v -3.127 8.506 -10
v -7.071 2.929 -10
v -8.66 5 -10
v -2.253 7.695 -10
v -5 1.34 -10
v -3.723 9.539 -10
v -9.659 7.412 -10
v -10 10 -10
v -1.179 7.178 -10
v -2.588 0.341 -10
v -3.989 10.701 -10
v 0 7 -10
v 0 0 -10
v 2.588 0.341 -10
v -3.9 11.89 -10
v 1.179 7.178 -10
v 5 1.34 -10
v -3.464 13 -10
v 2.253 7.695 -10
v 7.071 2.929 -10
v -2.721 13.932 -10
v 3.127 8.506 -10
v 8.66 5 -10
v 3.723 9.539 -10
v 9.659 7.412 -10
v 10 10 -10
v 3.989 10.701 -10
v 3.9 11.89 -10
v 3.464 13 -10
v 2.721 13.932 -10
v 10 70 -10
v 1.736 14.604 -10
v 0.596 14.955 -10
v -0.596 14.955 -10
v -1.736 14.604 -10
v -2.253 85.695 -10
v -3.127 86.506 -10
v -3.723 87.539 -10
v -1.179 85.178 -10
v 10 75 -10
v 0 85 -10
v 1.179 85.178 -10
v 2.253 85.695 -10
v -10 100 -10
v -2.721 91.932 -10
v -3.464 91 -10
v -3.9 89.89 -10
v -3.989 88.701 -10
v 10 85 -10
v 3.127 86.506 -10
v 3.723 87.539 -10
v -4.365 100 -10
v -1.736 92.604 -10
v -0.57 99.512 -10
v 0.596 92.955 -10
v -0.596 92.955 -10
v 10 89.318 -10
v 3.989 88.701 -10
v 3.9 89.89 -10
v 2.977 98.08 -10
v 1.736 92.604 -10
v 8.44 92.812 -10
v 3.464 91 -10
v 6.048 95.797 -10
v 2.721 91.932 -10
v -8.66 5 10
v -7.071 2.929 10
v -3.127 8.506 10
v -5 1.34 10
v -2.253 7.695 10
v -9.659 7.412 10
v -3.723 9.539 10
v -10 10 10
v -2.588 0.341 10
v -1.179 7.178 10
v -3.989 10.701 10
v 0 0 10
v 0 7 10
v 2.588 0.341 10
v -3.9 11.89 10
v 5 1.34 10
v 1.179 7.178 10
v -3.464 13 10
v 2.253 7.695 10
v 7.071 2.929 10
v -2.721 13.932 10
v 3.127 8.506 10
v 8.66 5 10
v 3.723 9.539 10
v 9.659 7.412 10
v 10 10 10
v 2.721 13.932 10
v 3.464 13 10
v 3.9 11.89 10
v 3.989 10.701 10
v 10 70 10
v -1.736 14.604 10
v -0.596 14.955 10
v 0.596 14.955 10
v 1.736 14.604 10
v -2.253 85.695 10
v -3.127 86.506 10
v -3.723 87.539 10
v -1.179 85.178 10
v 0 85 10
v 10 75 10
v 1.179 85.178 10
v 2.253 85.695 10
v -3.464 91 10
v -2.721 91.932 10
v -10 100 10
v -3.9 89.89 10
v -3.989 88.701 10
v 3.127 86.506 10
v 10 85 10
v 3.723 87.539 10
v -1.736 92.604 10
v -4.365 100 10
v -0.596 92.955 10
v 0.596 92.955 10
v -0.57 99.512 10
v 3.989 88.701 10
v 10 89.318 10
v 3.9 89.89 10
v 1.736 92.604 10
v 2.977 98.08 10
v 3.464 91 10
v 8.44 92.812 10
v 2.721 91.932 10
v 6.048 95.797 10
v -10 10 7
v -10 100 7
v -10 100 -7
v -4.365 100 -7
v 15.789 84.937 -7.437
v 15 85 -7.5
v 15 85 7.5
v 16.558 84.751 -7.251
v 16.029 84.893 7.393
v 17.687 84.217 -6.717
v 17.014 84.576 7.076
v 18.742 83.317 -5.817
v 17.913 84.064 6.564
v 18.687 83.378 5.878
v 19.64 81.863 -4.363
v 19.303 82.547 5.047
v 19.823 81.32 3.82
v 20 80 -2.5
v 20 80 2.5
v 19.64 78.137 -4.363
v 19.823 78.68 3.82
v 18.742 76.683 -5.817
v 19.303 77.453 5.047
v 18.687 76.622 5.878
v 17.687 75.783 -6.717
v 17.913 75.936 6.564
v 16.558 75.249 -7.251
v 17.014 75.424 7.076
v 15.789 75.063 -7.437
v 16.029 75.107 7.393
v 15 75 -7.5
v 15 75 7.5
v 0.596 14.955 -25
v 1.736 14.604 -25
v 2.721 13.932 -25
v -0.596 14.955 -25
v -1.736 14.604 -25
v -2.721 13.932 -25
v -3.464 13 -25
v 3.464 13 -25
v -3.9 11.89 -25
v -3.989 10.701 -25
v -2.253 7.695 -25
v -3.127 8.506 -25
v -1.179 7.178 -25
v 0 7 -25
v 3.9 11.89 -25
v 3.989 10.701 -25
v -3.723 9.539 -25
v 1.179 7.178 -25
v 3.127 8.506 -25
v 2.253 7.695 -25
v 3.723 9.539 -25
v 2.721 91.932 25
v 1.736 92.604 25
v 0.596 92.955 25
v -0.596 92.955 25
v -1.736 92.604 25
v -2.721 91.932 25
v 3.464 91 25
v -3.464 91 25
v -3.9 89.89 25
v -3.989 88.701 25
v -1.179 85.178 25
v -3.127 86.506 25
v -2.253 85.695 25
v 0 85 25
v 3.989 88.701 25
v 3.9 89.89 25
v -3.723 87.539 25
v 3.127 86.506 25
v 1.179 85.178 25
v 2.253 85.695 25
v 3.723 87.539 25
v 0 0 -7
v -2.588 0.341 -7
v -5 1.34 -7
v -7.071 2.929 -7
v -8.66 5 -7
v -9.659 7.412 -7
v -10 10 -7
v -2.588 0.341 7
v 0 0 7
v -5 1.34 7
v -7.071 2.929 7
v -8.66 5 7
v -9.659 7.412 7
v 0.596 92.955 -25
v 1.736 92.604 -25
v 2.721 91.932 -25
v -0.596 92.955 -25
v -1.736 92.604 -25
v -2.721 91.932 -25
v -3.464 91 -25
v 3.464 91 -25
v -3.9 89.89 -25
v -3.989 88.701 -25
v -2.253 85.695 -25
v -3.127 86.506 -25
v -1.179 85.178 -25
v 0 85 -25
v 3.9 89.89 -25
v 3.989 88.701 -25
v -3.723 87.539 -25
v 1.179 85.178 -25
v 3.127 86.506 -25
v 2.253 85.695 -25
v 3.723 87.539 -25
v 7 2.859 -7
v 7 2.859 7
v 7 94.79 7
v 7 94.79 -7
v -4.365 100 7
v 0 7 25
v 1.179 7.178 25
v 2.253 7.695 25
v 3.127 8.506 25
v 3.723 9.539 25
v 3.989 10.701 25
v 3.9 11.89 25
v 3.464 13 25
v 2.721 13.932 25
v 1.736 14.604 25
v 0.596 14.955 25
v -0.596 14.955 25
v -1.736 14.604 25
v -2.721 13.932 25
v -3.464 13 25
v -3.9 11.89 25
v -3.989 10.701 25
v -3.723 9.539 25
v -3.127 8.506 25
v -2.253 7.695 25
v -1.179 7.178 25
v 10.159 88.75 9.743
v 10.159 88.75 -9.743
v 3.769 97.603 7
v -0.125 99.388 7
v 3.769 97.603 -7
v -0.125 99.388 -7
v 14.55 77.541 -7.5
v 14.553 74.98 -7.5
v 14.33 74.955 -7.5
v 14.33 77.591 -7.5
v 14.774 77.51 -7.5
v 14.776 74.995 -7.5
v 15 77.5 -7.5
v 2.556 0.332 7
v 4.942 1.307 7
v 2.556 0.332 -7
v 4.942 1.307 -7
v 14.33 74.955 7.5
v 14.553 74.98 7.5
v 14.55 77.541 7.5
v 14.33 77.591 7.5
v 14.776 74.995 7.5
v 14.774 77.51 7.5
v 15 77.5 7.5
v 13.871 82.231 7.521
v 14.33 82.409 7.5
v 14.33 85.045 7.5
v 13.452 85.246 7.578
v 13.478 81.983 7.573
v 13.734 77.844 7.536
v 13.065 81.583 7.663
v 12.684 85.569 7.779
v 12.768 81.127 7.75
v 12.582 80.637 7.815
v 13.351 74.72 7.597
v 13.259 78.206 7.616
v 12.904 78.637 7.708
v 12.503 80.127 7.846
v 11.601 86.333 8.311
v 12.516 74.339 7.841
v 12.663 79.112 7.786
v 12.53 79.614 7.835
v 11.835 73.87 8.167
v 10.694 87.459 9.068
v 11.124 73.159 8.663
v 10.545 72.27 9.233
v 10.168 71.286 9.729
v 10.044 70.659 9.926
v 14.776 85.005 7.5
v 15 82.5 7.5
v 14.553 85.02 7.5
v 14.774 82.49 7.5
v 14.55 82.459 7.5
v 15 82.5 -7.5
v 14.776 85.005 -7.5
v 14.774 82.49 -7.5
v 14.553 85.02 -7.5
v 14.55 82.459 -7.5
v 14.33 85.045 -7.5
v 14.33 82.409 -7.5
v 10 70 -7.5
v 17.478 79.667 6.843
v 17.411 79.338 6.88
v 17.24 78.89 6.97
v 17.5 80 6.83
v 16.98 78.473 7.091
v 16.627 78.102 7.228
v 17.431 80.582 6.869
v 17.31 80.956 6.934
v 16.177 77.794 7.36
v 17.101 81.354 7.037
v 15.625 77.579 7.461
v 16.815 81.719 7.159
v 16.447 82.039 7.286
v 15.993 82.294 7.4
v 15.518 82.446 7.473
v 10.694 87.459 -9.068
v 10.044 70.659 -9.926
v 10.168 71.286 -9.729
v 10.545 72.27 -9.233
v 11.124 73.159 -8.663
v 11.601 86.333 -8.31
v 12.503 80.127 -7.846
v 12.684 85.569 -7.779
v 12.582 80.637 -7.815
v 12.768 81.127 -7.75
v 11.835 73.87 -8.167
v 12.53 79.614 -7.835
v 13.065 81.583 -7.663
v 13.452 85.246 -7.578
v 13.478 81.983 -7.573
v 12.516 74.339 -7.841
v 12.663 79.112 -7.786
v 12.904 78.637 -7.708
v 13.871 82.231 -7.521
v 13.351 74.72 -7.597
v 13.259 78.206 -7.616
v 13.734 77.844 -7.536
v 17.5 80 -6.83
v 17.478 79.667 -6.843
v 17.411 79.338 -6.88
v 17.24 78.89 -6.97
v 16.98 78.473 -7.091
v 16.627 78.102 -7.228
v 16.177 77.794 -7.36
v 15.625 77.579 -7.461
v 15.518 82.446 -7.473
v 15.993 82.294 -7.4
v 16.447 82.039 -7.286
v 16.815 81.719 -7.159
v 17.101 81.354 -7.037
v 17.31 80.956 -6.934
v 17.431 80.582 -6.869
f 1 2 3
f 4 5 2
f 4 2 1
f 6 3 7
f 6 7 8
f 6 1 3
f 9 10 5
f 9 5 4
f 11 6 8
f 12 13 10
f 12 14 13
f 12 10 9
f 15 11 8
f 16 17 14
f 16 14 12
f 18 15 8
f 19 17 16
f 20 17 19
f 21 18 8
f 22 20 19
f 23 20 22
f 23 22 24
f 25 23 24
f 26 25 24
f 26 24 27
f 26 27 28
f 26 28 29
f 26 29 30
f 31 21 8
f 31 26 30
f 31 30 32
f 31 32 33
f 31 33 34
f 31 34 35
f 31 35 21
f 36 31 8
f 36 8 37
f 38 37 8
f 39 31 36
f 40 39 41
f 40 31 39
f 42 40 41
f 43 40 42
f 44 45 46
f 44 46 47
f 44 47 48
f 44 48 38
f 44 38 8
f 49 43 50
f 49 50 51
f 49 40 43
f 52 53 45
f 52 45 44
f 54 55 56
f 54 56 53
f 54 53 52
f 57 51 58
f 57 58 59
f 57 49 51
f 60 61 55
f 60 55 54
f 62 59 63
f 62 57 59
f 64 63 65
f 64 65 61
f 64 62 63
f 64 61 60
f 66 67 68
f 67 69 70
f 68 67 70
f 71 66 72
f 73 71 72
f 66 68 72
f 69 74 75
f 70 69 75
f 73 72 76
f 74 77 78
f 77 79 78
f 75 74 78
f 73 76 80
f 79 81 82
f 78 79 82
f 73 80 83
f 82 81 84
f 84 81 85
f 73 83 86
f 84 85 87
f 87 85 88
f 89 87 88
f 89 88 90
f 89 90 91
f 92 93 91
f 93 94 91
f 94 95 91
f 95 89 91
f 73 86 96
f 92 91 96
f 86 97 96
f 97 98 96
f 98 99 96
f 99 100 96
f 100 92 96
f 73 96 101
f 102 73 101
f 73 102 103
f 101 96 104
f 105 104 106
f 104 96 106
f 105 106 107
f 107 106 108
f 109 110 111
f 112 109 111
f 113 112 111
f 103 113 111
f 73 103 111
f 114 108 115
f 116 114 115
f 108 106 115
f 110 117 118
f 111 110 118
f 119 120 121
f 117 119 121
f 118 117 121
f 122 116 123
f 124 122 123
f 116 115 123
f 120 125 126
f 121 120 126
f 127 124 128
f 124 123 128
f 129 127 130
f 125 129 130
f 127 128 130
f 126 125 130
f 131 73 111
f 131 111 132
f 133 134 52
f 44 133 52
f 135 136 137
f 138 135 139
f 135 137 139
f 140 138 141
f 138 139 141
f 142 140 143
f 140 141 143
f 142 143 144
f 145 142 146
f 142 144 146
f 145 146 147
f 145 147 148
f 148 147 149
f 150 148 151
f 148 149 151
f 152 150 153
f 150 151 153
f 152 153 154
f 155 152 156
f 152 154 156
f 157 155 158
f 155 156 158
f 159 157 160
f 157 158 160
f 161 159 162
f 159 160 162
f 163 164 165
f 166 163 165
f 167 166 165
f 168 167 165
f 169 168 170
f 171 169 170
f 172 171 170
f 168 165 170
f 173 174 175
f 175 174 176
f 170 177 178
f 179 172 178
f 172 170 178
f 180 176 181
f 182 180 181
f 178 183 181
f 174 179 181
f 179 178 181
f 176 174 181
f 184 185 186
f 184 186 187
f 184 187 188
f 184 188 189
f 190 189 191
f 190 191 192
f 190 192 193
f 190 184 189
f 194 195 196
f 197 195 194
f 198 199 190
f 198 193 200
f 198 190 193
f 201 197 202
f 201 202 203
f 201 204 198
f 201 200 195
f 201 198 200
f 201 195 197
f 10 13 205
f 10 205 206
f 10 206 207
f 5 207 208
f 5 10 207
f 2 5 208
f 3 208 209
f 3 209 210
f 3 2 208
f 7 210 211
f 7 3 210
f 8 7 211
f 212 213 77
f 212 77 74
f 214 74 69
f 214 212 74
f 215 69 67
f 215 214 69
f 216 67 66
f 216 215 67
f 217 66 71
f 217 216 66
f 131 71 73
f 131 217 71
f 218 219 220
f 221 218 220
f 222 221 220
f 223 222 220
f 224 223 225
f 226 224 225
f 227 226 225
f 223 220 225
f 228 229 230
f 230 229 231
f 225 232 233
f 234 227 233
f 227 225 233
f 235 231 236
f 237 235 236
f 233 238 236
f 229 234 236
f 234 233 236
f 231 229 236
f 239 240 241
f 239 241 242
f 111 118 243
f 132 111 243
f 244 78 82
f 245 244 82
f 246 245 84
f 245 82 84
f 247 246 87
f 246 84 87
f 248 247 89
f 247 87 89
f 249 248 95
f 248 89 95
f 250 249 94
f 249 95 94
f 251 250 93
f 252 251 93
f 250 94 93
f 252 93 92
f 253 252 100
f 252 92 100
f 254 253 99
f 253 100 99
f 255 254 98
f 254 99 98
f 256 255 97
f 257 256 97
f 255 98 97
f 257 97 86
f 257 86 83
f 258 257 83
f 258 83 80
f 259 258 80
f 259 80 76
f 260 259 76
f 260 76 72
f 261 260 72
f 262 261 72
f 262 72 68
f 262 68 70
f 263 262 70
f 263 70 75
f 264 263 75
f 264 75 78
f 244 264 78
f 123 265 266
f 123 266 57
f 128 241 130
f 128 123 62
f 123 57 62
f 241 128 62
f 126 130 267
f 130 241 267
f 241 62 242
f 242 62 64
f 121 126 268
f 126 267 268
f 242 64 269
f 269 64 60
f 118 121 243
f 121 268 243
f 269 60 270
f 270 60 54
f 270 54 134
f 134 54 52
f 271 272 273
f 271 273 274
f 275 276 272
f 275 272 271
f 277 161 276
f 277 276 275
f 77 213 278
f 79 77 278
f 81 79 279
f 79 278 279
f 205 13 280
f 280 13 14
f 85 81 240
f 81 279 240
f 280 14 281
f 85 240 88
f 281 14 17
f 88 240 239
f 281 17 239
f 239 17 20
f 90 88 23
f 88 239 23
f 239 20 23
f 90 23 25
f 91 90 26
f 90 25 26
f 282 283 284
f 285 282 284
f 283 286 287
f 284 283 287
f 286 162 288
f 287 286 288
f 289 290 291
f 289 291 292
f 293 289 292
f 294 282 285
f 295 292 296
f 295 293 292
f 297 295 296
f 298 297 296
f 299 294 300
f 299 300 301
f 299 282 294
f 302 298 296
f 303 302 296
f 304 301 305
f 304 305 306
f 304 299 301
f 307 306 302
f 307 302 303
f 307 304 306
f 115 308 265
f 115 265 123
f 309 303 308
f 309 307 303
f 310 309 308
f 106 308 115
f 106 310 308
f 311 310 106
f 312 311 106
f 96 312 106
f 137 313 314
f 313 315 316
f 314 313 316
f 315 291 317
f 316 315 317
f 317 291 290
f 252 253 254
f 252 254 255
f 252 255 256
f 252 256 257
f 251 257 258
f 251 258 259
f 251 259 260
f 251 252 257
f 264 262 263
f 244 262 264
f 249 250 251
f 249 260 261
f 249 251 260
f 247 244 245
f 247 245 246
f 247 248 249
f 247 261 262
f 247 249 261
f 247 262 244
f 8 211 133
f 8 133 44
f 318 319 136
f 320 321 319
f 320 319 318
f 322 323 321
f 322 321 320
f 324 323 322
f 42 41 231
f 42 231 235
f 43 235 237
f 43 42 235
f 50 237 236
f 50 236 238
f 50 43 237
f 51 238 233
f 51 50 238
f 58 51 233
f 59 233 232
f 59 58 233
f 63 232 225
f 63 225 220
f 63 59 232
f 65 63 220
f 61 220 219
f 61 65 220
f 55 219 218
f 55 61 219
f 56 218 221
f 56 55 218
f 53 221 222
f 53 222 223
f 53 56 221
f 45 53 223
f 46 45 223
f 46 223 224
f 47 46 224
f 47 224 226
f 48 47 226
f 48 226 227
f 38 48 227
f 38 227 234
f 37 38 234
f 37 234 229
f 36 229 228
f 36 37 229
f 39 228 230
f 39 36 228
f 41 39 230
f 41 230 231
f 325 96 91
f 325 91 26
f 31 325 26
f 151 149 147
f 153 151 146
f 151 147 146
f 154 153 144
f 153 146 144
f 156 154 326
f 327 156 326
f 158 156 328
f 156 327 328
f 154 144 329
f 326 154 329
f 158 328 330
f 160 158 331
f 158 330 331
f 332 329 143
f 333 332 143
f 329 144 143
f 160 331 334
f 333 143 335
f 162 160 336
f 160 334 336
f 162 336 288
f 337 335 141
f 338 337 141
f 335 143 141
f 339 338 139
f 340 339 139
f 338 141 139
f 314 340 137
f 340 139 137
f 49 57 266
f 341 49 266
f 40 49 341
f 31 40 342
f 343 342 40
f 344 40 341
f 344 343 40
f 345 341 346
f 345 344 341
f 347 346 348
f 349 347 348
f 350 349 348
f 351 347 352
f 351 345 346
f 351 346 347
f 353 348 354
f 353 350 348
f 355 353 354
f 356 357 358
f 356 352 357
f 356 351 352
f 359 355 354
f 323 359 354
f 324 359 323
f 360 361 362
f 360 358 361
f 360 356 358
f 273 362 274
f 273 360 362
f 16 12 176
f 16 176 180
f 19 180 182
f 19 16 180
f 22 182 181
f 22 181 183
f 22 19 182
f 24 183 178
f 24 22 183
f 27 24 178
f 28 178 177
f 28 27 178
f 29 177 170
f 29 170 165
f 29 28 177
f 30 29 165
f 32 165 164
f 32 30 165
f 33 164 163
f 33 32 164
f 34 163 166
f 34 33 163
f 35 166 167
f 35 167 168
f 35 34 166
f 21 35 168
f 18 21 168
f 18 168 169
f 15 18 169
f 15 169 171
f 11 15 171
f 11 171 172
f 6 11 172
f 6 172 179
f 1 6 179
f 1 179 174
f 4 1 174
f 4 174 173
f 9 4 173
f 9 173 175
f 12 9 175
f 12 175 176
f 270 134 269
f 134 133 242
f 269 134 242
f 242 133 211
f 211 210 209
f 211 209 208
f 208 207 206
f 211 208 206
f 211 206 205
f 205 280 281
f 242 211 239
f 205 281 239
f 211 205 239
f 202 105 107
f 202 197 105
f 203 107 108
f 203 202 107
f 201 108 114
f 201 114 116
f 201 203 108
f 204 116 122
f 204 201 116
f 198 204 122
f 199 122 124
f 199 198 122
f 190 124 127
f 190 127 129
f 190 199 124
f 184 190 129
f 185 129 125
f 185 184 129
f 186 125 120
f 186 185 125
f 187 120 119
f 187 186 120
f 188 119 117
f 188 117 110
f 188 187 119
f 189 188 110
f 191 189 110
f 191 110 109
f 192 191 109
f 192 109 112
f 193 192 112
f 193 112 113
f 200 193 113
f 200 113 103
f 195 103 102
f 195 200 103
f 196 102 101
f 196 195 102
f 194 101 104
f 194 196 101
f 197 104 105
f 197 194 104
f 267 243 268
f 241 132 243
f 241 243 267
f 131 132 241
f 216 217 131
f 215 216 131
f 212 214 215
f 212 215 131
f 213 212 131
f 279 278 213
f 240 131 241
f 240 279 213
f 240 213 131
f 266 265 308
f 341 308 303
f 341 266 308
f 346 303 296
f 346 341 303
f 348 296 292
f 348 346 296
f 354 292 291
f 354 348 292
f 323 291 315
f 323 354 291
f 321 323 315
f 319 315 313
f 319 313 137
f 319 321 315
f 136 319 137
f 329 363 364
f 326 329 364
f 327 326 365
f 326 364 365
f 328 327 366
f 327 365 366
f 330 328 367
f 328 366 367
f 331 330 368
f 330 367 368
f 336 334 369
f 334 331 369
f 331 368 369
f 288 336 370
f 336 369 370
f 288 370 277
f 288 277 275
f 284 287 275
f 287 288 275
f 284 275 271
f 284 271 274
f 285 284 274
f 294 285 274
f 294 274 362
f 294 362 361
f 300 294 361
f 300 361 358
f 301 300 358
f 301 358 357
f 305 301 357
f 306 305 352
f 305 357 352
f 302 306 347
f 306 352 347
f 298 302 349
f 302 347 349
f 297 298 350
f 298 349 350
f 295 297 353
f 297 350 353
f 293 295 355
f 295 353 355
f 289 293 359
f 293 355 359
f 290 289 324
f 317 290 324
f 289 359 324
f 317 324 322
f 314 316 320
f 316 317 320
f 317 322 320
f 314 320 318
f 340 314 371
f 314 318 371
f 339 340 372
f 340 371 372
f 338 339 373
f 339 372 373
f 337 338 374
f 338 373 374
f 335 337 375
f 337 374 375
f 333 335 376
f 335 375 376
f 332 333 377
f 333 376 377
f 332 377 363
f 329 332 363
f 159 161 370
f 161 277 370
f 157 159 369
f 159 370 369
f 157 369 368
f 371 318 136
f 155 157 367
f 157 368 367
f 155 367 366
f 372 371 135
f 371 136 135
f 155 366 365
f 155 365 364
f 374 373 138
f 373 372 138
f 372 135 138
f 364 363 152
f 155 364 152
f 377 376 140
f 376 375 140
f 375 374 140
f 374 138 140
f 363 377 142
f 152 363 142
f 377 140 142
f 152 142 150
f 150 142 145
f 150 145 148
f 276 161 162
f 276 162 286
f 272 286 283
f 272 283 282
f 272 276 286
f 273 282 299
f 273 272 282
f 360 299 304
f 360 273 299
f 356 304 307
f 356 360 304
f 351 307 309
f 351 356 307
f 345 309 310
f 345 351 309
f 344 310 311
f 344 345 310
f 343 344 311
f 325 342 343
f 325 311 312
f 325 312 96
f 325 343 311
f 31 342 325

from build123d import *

# Parameters (mm, degrees)
SKETCH1_W               = 20
SKETCH1_H               = 100
BOSS_EXTRUDE1_DEPTH     = 10
SKETCH3_R               = 4
BOSS_EXTRUDE2_DEPTH     = 25
FILLET1_R               = 10
SKETCH5_W               = 10
SKETCH5_H               = 10
SKETCH5_R               = 2.5
BOSS_EXTRUDE3_DEPTH     = 7.5
FILLET2_R               = 5
CUT_EXTRUDE1_DEPTH      = 106.000000019
CUT_EXTRUDE1_DEPTH_BACK = 106.000000019
SKETCH6_W               = 17
SKETCH6_H               = 14
FILLET3_R               = 15


# Some blends are built 0.0001 mm under size
with BuildPart() as part:
    # Sketch1 → Boss-Extrude1 (new, symmetric)
    with BuildSketch(Plane(origin=(0, 0, 0), x_dir=(0, 0, -1), z_dir=(1, 0, 0))):
        with Locations((0, 50)):
            Rectangle(SKETCH1_W, SKETCH1_H)
    extrude(amount=BOSS_EXTRUDE1_DEPTH, both=True)

    # Sketch3 → Boss-Extrude2 (add, symmetric)
    with BuildSketch(Plane.XY):
        with Locations(Location((0, 11, 0), (0, 0, 270))):
            Circle(SKETCH3_R)
        with Locations(Location((0, 89, 0), (0, 0, 270))):
            Circle(SKETCH3_R)
    extrude(amount=BOSS_EXTRUDE2_DEPTH, both=True)

    # Fillet1
    fillet1_edges = [part.edges().sort_by_distance(p)[0] for p in [
        (10, 0, 0),
        (-10, 0, 0),
    ]]
    fillet(fillet1_edges, radius=FILLET1_R - 0.0001)  # a hair under: the kernel refuses the full size

    # Sketch5 → Boss-Extrude3 (add, symmetric)
    with BuildSketch(Plane.XY):
        with Locations((15, 80)):
            Rectangle(SKETCH5_W, SKETCH5_H)
        with Locations((15, 80)):
            Circle(SKETCH5_R, mode=Mode.SUBTRACT)
    extrude(amount=BOSS_EXTRUDE3_DEPTH, both=True)

    # Fillet2
    # the kernel refuses this fillet: 5 mm, written as the material it takes off along each edge
    with BuildSketch(Plane(origin=(20, 97.5, 7.5), x_dir=(-1, 0, 0), z_dir=(0, -1, 0))) as fillet2_piece_1:
        with BuildLine():
            CenterArc((FILLET2_R, FILLET2_R), FILLET2_R, 180, 90)
            Line((0, FILLET2_R), (0, 0))
            Line((0, 0), (FILLET2_R, 0))
        make_face()
    extrude(amount=35, mode=Mode.SUBTRACT)
    with BuildSketch(Plane(origin=(20, 97.5, -7.5), x_dir=(-1, 0, 0), z_dir=(0, -1, 0))) as fillet2_piece_2:
        with BuildLine():
            CenterArc((FILLET2_R, -FILLET2_R), FILLET2_R, 90, 90)
            Line((0, -FILLET2_R), (0, 0))
            Line((0, 0), (FILLET2_R, 0))
        make_face()
    extrude(amount=35, mode=Mode.SUBTRACT)
    with BuildSketch(Plane(origin=(20, 75, 20), x_dir=(-1, 0, 0), z_dir=(0, 0, -1))) as fillet2_piece_3:
        with BuildLine():
            CenterArc((FILLET2_R, FILLET2_R), FILLET2_R, 180, 90)
            Line((0, FILLET2_R), (0, 0))
            Line((0, 0), (FILLET2_R, 0))
        make_face()
    extrude(amount=40, mode=Mode.SUBTRACT)
    with BuildSketch(Plane(origin=(20, 85, 20), x_dir=(-1, 0, 0), z_dir=(0, 0, -1))) as fillet2_piece_4:
        with BuildLine():
            CenterArc((FILLET2_R, -FILLET2_R), FILLET2_R, 90, 90)
            Line((0, -FILLET2_R), (0, 0))
            Line((0, 0), (FILLET2_R, 0))
        make_face()
    extrude(amount=40, mode=Mode.SUBTRACT)
    # the kernel refuses this fillet: 5 mm, written as the material it adds along each edge
    with BuildSketch(Plane(origin=(10, 75, 7.5), x_dir=(0, 0, 1), z_dir=(0, 1, 0))) as fillet2_2_piece_1_section:
        with BuildLine():
            CenterArc((5, 4.330127019), FILLET2_R, 180, 60)
            Line((0, 4.330127019), (0, 0))
            Line((0, 0), (2.5, 0))
        make_face()
    fillet2_2_piece_1 = extrude(amount=10, mode=Mode.PRIVATE)
    fillet2_2_piece_1 = fillet2_2_piece_1 - Plane(origin=(15, 80, 7.5), x_dir=(1, 0, 0), z_dir=(0, 0, -1)) * Cylinder(2.5, 38, mode=Mode.PRIVATE)
    add(fillet2_2_piece_1)
    with BuildSketch(Plane(origin=(10, 75, -7.5), x_dir=(0, 0, -1), z_dir=(0, 1, 0))) as fillet2_2_piece_2_section:
        with BuildLine():
            CenterArc((5, -4.330127019), FILLET2_R, 120, 60)
            Line((0, -4.330127019), (0, 0))
            Line((0, 0), (2.5, 0))
        make_face()
    fillet2_2_piece_2 = extrude(amount=10, mode=Mode.PRIVATE)
    fillet2_2_piece_2 = fillet2_2_piece_2 - Plane(origin=(15, 80, -7.5), x_dir=(1, 0, 0), z_dir=(0, 0, -1)) * Cylinder(2.5, 38, mode=Mode.PRIVATE)
    add(fillet2_2_piece_2)
    with BuildSketch(Plane(origin=(10, 85, -7.5), x_dir=(0, 1, 0), z_dir=(0, 0, 1))) as fillet2_2_piece_3:
        with BuildLine():
            CenterArc((FILLET2_R, -FILLET2_R), FILLET2_R, 90, 90)
            Line((0, -FILLET2_R), (0, 0))
            Line((0, 0), (FILLET2_R, 0))
        make_face()
    extrude(amount=15)
    with BuildSketch(Plane(origin=(10, 75, -7.5), x_dir=(0, -1, 0), z_dir=(0, 0, 1))) as fillet2_2_piece_4:
        with BuildLine():
            CenterArc((FILLET2_R, FILLET2_R), FILLET2_R, 180, 90)
            Line((0, FILLET2_R), (0, 0))
            Line((0, 0), (FILLET2_R, 0))
        make_face()
    extrude(amount=15)
    with BuildSketch(Plane(origin=(10, 64.174682453, 7.5), x_dir=(0, 0, 1), z_dir=(0, 1, 0))) as fillet2_2_piece_5a_section:
        with BuildLine():
            CenterArc((5, 4.330127019), FILLET2_R, 180, 60)
            Line((0, 4.330127019), (0, 0))
            Line((0, 0), (2.5, 0))
        make_face()
    fillet2_2_piece_5a = extrude(amount=20.825317547, mode=Mode.PRIVATE)
    fillet2_2_piece_5a = split(fillet2_2_piece_5a, bisect_by=Plane(origin=(10, 75, 7.5), z_dir=(0, -1, 0)), keep=Keep.TOP, mode=Mode.PRIVATE)
    with BuildSketch(Plane(origin=(10, 75, -7.5), x_dir=(0, -1, 0), z_dir=(0, 0, 1))) as fillet2_2_piece_5b_section:
        with BuildLine():
            CenterArc((FILLET2_R, FILLET2_R), FILLET2_R, 180, 90)
            Line((0, FILLET2_R), (0, 0))
            Line((0, 0), (FILLET2_R, 0))
        make_face()
    fillet2_2_piece_5b = extrude(amount=27.5, mode=Mode.PRIVATE)
    fillet2_2_piece_5b = split(fillet2_2_piece_5b, bisect_by=Plane(origin=(10, 75, 10), z_dir=(0, 0, -1)), keep=Keep.TOP, mode=Mode.PRIVATE)
    fillet2_2_piece_5b = split(fillet2_2_piece_5b, bisect_by=Plane(origin=(10, 75, 7.5), z_dir=(0, 0, 1)), keep=Keep.TOP, mode=Mode.PRIVATE)
    fillet2_2_piece_5 = fillet2_2_piece_5a & fillet2_2_piece_5b
    add(fillet2_2_piece_5)
    with BuildSketch(Plane(origin=(10, 85, -7.5), x_dir=(0, 1, 0), z_dir=(0, 0, 1))) as fillet2_2_piece_6a_section:
        with BuildLine():
            CenterArc((FILLET2_R, -FILLET2_R), FILLET2_R, 90, 90)
            Line((0, -FILLET2_R), (0, 0))
            Line((0, 0), (FILLET2_R, 0))
        make_face()
    fillet2_2_piece_6a = extrude(amount=27.5, mode=Mode.PRIVATE)
    fillet2_2_piece_6a = split(fillet2_2_piece_6a, bisect_by=Plane(origin=(10, 85, 10), z_dir=(0, 0, -1)), keep=Keep.TOP, mode=Mode.PRIVATE)
    fillet2_2_piece_6a = split(fillet2_2_piece_6a, bisect_by=Plane(origin=(10, 85, 7.5), z_dir=(0, 0, 1)), keep=Keep.TOP, mode=Mode.PRIVATE)
    with BuildSketch(Plane(origin=(10, 75, 7.5), x_dir=(0, 0, 1), z_dir=(0, 1, 0))) as fillet2_2_piece_6b_section:
        with BuildLine():
            CenterArc((5, 4.330127019), FILLET2_R, 180, 60)
            Line((0, 4.330127019), (0, 0))
            Line((0, 0), (2.5, 0))
        make_face()
    fillet2_2_piece_6b = extrude(amount=20.825317547, mode=Mode.PRIVATE)
    fillet2_2_piece_6b = split(fillet2_2_piece_6b, bisect_by=Plane(origin=(10, 85, 7.5), z_dir=(0, 1, 0)), keep=Keep.TOP, mode=Mode.PRIVATE)
    fillet2_2_piece_6 = fillet2_2_piece_6a & fillet2_2_piece_6b
    add(fillet2_2_piece_6)
    with BuildSketch(Plane(origin=(10, 75, -20), x_dir=(0, -1, 0), z_dir=(0, 0, 1))) as fillet2_2_piece_7a_section:
        with BuildLine():
            CenterArc((FILLET2_R, FILLET2_R), FILLET2_R, 180, 90)
            Line((0, FILLET2_R), (0, 0))
            Line((0, 0), (FILLET2_R, 0))
        make_face()
    fillet2_2_piece_7a = extrude(amount=27.5, mode=Mode.PRIVATE)
    fillet2_2_piece_7a = split(fillet2_2_piece_7a, bisect_by=Plane(origin=(10, 75, -10), z_dir=(0, 0, 1)), keep=Keep.TOP, mode=Mode.PRIVATE)
    fillet2_2_piece_7a = split(fillet2_2_piece_7a, bisect_by=Plane(origin=(10, 75, -7.5), z_dir=(0, 0, -1)), keep=Keep.TOP, mode=Mode.PRIVATE)
    with BuildSketch(Plane(origin=(10, 64.174682453, -7.5), x_dir=(0, 0, -1), z_dir=(0, 1, 0))) as fillet2_2_piece_7b_section:
        with BuildLine():
            CenterArc((5, -4.330127019), FILLET2_R, 120, 60)
            Line((0, -4.330127019), (0, 0))
            Line((0, 0), (2.5, 0))
        make_face()
    fillet2_2_piece_7b = extrude(amount=20.825317547, mode=Mode.PRIVATE)
    fillet2_2_piece_7b = split(fillet2_2_piece_7b, bisect_by=Plane(origin=(10, 75, -7.5), z_dir=(0, -1, 0)), keep=Keep.TOP, mode=Mode.PRIVATE)
    fillet2_2_piece_7 = fillet2_2_piece_7a & fillet2_2_piece_7b
    add(fillet2_2_piece_7)
    with BuildSketch(Plane(origin=(10, 85, -20), x_dir=(0, 1, 0), z_dir=(0, 0, 1))) as fillet2_2_piece_8a_section:
        with BuildLine():
            CenterArc((FILLET2_R, -FILLET2_R), FILLET2_R, 90, 90)
            Line((0, -FILLET2_R), (0, 0))
            Line((0, 0), (FILLET2_R, 0))
        make_face()
    fillet2_2_piece_8a = extrude(amount=27.5, mode=Mode.PRIVATE)
    fillet2_2_piece_8a = split(fillet2_2_piece_8a, bisect_by=Plane(origin=(10, 85, -10), z_dir=(0, 0, 1)), keep=Keep.TOP, mode=Mode.PRIVATE)
    fillet2_2_piece_8a = split(fillet2_2_piece_8a, bisect_by=Plane(origin=(10, 85, -7.5), z_dir=(0, 0, -1)), keep=Keep.TOP, mode=Mode.PRIVATE)
    with BuildSketch(Plane(origin=(10, 75, -7.5), x_dir=(0, 0, -1), z_dir=(0, 1, 0))) as fillet2_2_piece_8b_section:
        with BuildLine():
            CenterArc((5, -4.330127019), FILLET2_R, 120, 60)
            Line((0, -4.330127019), (0, 0))
            Line((0, 0), (2.5, 0))
        make_face()
    fillet2_2_piece_8b = extrude(amount=20.825317547, mode=Mode.PRIVATE)
    fillet2_2_piece_8b = split(fillet2_2_piece_8b, bisect_by=Plane(origin=(10, 85, -7.5), z_dir=(0, 1, 0)), keep=Keep.TOP, mode=Mode.PRIVATE)
    fillet2_2_piece_8 = fillet2_2_piece_8a & fillet2_2_piece_8b
    add(fillet2_2_piece_8)

    # Sketch6 → Cut-Extrude1 (cut, two sides: drawn at the far end of the back side and taken through both)
    with BuildSketch(Plane(origin=(0, 100, 0), x_dir=(1, 0, 0), z_dir=(0, 1, 0)).offset(-CUT_EXTRUDE1_DEPTH_BACK)):
        with Locations((-1.5, 0)):
            Rectangle(SKETCH6_W, SKETCH6_H)
    extrude(amount=CUT_EXTRUDE1_DEPTH + CUT_EXTRUDE1_DEPTH_BACK, mode=Mode.SUBTRACT)

    # Fillet3
    # the kernel refuses this fillet: 15 mm, written as the material it takes off along each edge
    with BuildSketch(Plane(origin=(10, 100, -45.912291828), x_dir=(0.014111556263048879, -0.9999004270325296, 0), z_dir=(0, 0, 1))) as fillet3_piece_1:
        with BuildLine():
            CenterArc((14.795795075, -14.575159718), FILLET3_R, 103.668952733, 75.522487814)
            Line((-0.202711331, -14.363486374), (-1.702561971, -14.342319039))
            Line((-1.702561971, -14.342319039), (-1.499850641, 0.021167334))
            Line((-1.499850641, 0.021167334), (0.021167334, 1.499850641))
            ThreePointArc((0.021167334, 1.499850641), (10.020171605, 1.358735078), (10.896652831, 1.457515972))
            Line((10.896652831, 1.457515972), (11.251120307, 0))
        make_face()
    extrude(amount=91.824583655, mode=Mode.SUBTRACT)


solid = part.part
